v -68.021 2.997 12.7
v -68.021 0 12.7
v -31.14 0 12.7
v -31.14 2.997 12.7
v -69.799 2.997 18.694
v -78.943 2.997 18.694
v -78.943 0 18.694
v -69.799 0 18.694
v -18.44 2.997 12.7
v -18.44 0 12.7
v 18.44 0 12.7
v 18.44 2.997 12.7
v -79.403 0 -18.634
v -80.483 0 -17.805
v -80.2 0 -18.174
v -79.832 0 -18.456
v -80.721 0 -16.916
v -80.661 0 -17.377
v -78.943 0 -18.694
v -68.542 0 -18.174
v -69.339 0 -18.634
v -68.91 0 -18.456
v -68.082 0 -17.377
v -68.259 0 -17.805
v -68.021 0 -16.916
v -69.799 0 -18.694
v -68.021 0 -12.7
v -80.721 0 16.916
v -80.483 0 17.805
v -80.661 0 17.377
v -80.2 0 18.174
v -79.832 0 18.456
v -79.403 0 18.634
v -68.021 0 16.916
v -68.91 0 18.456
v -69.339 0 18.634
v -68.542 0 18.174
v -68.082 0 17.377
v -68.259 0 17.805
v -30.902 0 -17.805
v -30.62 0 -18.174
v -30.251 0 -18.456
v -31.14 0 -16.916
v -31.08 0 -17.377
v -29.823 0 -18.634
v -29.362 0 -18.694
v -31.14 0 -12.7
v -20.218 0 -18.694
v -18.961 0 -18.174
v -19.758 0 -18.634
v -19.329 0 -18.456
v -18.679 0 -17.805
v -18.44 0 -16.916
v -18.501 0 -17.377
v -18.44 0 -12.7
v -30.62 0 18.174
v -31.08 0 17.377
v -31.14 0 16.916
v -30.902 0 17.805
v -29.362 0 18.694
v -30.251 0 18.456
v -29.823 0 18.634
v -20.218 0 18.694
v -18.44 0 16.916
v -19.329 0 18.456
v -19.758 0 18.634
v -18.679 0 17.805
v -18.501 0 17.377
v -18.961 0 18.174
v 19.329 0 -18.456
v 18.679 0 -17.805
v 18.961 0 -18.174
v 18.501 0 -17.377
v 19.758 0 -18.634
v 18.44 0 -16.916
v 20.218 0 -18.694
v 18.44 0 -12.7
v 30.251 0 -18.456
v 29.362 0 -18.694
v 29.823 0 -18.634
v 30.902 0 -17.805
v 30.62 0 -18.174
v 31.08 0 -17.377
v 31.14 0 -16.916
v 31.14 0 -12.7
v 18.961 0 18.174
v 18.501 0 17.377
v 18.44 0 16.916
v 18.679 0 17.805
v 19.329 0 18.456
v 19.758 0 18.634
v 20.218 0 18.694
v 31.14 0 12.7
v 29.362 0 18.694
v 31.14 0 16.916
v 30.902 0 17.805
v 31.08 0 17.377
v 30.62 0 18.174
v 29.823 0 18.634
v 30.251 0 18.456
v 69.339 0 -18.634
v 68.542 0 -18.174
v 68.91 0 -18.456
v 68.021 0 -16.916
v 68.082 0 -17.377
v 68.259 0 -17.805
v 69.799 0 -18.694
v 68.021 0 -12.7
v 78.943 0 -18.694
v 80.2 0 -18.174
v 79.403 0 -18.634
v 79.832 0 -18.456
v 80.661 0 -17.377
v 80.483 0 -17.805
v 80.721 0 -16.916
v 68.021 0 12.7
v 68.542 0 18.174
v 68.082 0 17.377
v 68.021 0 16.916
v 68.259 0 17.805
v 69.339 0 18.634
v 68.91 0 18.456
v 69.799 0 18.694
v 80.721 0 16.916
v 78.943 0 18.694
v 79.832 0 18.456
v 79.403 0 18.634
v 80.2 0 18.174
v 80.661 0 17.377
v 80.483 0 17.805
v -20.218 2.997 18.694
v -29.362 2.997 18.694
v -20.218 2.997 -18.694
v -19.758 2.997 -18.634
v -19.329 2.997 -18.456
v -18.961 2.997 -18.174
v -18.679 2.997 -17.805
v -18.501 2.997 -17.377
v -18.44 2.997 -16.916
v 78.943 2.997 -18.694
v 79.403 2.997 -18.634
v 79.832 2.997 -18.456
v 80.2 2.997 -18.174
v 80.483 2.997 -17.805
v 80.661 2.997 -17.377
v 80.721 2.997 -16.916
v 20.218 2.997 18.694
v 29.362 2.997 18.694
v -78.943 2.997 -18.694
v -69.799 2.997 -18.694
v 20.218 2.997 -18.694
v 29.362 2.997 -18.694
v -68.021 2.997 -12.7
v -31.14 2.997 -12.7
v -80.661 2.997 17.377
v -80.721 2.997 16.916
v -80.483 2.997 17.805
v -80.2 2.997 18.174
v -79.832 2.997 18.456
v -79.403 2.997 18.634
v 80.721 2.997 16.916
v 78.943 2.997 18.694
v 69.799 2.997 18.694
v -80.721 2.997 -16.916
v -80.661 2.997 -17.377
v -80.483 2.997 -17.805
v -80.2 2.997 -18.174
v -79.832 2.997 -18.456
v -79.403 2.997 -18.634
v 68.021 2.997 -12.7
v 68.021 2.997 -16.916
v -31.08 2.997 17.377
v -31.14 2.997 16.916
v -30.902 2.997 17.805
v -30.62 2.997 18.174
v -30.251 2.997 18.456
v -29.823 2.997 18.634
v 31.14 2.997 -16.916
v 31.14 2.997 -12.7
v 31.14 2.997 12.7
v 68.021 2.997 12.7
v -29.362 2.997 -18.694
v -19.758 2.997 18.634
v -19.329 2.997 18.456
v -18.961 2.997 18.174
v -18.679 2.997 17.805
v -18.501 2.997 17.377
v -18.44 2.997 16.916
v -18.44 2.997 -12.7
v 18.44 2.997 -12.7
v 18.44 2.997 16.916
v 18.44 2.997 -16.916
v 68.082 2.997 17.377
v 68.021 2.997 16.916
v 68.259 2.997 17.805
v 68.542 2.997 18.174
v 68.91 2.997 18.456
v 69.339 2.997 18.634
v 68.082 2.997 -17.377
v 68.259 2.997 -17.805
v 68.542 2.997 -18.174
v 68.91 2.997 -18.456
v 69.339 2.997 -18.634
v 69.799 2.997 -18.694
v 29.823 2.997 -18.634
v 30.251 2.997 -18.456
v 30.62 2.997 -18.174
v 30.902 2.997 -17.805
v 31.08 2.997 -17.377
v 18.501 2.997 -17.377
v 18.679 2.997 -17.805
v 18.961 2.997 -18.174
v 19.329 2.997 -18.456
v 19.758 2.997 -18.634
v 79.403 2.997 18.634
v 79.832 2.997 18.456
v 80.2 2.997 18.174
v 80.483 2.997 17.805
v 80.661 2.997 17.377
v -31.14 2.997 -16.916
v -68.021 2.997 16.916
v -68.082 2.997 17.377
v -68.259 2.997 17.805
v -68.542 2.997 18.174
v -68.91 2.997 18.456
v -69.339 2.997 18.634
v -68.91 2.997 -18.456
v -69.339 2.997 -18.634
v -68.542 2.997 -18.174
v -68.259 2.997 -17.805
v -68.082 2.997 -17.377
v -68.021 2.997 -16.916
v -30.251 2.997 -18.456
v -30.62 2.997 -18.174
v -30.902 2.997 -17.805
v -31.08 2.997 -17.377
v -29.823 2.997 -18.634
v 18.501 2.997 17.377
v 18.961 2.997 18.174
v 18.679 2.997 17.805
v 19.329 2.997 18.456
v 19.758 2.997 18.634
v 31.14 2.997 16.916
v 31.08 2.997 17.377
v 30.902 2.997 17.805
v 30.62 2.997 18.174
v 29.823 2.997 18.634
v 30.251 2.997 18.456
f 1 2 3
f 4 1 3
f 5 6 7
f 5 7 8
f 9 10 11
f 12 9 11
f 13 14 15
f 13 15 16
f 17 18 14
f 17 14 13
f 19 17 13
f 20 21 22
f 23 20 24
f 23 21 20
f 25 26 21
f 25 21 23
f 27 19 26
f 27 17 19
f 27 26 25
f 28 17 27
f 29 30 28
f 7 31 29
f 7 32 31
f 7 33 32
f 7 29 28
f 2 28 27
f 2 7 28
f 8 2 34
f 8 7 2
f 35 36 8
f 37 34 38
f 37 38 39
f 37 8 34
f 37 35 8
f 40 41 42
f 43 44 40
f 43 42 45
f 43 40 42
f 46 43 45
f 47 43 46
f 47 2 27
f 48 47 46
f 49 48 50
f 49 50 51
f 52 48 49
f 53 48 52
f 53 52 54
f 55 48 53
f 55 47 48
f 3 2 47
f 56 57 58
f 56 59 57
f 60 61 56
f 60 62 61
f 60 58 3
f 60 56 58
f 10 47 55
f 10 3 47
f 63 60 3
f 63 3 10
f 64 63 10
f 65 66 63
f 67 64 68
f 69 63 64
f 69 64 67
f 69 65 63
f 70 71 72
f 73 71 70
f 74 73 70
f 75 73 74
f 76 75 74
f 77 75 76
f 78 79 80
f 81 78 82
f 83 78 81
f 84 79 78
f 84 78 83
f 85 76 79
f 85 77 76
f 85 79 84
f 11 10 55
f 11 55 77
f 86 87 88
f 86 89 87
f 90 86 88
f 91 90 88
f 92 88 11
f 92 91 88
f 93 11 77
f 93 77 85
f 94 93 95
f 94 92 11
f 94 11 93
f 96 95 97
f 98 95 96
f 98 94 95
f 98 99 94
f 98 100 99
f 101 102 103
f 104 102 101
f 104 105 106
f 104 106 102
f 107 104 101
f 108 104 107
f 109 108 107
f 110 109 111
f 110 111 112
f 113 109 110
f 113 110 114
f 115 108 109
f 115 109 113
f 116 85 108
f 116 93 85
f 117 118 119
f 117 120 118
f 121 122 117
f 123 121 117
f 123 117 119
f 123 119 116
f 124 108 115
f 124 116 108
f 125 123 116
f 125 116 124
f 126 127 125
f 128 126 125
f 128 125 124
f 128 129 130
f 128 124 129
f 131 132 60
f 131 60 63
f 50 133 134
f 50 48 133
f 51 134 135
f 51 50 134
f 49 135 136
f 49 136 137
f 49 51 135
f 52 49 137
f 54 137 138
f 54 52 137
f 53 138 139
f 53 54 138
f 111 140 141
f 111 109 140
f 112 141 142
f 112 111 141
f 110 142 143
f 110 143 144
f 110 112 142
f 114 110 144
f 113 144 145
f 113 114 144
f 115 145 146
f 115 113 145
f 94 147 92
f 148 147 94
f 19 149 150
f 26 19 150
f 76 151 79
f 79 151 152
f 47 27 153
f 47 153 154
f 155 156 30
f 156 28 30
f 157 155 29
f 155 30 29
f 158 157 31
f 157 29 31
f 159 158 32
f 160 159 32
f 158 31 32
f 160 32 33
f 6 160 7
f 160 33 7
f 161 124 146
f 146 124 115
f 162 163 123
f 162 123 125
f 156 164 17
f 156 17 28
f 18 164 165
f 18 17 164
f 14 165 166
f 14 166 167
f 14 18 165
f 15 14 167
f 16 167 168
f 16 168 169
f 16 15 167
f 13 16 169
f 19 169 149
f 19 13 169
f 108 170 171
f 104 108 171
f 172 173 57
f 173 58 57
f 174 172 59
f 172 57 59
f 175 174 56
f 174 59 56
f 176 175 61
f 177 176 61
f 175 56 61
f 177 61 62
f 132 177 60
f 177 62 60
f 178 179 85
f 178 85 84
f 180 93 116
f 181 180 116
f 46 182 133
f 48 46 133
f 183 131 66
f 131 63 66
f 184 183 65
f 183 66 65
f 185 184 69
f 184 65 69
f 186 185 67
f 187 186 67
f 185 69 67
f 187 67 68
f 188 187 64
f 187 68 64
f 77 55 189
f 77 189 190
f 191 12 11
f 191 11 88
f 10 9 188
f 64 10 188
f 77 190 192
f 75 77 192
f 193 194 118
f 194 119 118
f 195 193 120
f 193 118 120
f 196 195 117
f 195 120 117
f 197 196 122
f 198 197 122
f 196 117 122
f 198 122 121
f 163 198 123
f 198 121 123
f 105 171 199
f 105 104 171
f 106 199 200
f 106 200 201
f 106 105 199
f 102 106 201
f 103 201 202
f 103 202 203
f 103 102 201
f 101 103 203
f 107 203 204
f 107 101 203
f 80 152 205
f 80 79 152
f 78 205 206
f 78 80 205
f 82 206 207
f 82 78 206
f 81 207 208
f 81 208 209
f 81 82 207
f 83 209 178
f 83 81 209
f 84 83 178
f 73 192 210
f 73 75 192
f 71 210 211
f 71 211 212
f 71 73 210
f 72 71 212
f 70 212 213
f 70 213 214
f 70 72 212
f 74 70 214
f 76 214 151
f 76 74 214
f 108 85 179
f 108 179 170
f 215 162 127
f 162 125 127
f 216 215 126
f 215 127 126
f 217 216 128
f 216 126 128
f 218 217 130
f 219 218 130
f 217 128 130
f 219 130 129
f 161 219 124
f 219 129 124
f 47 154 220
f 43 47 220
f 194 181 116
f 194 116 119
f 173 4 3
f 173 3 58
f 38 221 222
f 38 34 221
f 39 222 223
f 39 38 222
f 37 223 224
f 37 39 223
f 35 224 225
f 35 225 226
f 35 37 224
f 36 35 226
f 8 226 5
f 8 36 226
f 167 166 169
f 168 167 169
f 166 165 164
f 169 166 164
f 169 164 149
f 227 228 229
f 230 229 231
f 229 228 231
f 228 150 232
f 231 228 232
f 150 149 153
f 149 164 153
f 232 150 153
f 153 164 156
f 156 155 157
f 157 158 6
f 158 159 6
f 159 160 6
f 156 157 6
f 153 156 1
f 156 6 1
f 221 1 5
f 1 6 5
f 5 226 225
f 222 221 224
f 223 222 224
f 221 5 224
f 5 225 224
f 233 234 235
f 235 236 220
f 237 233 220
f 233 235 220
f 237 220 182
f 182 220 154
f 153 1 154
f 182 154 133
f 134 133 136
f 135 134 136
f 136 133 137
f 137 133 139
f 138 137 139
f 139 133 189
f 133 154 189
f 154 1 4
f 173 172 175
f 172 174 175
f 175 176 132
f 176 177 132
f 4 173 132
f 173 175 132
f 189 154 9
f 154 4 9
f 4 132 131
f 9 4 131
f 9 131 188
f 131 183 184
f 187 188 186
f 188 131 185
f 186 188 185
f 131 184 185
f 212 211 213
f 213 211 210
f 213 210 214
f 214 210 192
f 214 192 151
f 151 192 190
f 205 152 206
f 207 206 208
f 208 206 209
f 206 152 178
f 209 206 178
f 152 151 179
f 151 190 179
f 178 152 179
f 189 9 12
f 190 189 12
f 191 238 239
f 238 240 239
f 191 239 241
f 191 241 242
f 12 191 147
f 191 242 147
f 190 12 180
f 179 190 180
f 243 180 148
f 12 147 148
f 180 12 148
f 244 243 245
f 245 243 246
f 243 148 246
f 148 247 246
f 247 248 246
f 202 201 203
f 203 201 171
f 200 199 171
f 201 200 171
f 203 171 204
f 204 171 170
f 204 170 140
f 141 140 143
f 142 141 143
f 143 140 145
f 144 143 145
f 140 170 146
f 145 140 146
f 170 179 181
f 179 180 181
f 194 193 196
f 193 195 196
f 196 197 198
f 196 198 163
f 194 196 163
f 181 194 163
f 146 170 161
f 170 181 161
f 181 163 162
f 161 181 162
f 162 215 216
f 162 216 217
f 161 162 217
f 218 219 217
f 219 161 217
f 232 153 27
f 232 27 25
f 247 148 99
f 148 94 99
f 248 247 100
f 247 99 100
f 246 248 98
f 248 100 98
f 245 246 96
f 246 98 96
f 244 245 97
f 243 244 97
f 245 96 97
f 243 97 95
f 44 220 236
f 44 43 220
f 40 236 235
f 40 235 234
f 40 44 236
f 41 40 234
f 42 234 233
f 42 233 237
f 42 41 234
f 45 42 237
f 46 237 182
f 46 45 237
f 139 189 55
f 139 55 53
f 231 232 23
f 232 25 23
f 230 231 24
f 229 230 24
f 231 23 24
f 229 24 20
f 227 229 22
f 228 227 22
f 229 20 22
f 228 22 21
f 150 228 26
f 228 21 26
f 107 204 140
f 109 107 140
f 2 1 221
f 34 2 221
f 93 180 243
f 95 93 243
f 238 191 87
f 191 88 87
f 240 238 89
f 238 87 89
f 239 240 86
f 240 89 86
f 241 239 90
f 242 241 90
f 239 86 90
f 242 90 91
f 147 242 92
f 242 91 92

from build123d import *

# Parameters (mm, degrees)
SKETCH1_W            = 161.4424
SKETCH1_H            = 25.4
BOSS_EXTRUDE1_DEPTH  = 2.9972
SKETCH2_W            = 12.7
SKETCH2_H            = 5.9944
BOSS_EXTRUDE2_DEPTH  = 2.9972
FILLET1_R            = 1.778
FILLET1_OF_MIRROR1_R = 1.778


with BuildPart() as part:
    # Sketch1 → Boss-Extrude1 (new body)
    with BuildSketch(Plane(origin=(0, 0, 0), x_dir=(1, 0, 0), z_dir=(0, 1, 0))):
        Rectangle(SKETCH1_W, SKETCH1_H)
    extrude(amount=BOSS_EXTRUDE1_DEPTH)

    # Sketch2 → Boss-Extrude2 (add)
    with BuildSketch(Plane(origin=(0, 2.9972, 0), x_dir=(1, 0, 0), z_dir=(0, 1, 0))):
        with Locations((-74.3712, 15.6972)):
            Rectangle(SKETCH2_W, SKETCH2_H)
        with Locations((-24.7904, 15.6972)):
            Rectangle(SKETCH2_W, SKETCH2_H)
        with Locations((24.7904, 15.6972)):
            Rectangle(SKETCH2_W, SKETCH2_H)
        with Locations((74.3712, 15.6972)):
            Rectangle(SKETCH2_W, SKETCH2_H)
    boss_extrude2 = extrude(amount=-BOSS_EXTRUDE2_DEPTH)

    # Fillet1
    fillet1_edges = [part.edges().sort_by_distance(p)[0] for p in [
        (-68.0212, 1.4986, -18.6944),
        (-80.7212, 1.4986, -18.6944),
        (-18.4404, 1.4986, -18.6944),
        (-31.1404, 1.4986, -18.6944),
        (31.1404, 1.4986, -18.6944),
        (18.4404, 1.4986, -18.6944),
        (68.0212, 1.4986, -18.6944),
        (80.7212, 1.4986, -18.6944),
    ]]
    fillet(fillet1_edges, radius=FILLET1_R)

    # Mirror1: Boss-Extrude2 across plane
    add(boss_extrude2.mirror(Plane.XY))

    # Fillet1 of Mirror1
    fillet1_of_mirror1_edges = [part.edges().sort_by_distance(p)[0] for p in [
        (-68.0212, 1.4986, 18.6944),
        (-80.7212, 1.4986, 18.6944),
        (-18.4404, 1.4986, 18.6944),
        (-31.1404, 1.4986, 18.6944),
        (31.1404, 1.4986, 18.6944),
        (18.4404, 1.4986, 18.6944),
        (68.0212, 1.4986, 18.6944),
        (80.7212, 1.4986, 18.6944),
    ]]
    fillet(fillet1_of_mirror1_edges, radius=FILLET1_OF_MIRROR1_R)


solid = part.part
